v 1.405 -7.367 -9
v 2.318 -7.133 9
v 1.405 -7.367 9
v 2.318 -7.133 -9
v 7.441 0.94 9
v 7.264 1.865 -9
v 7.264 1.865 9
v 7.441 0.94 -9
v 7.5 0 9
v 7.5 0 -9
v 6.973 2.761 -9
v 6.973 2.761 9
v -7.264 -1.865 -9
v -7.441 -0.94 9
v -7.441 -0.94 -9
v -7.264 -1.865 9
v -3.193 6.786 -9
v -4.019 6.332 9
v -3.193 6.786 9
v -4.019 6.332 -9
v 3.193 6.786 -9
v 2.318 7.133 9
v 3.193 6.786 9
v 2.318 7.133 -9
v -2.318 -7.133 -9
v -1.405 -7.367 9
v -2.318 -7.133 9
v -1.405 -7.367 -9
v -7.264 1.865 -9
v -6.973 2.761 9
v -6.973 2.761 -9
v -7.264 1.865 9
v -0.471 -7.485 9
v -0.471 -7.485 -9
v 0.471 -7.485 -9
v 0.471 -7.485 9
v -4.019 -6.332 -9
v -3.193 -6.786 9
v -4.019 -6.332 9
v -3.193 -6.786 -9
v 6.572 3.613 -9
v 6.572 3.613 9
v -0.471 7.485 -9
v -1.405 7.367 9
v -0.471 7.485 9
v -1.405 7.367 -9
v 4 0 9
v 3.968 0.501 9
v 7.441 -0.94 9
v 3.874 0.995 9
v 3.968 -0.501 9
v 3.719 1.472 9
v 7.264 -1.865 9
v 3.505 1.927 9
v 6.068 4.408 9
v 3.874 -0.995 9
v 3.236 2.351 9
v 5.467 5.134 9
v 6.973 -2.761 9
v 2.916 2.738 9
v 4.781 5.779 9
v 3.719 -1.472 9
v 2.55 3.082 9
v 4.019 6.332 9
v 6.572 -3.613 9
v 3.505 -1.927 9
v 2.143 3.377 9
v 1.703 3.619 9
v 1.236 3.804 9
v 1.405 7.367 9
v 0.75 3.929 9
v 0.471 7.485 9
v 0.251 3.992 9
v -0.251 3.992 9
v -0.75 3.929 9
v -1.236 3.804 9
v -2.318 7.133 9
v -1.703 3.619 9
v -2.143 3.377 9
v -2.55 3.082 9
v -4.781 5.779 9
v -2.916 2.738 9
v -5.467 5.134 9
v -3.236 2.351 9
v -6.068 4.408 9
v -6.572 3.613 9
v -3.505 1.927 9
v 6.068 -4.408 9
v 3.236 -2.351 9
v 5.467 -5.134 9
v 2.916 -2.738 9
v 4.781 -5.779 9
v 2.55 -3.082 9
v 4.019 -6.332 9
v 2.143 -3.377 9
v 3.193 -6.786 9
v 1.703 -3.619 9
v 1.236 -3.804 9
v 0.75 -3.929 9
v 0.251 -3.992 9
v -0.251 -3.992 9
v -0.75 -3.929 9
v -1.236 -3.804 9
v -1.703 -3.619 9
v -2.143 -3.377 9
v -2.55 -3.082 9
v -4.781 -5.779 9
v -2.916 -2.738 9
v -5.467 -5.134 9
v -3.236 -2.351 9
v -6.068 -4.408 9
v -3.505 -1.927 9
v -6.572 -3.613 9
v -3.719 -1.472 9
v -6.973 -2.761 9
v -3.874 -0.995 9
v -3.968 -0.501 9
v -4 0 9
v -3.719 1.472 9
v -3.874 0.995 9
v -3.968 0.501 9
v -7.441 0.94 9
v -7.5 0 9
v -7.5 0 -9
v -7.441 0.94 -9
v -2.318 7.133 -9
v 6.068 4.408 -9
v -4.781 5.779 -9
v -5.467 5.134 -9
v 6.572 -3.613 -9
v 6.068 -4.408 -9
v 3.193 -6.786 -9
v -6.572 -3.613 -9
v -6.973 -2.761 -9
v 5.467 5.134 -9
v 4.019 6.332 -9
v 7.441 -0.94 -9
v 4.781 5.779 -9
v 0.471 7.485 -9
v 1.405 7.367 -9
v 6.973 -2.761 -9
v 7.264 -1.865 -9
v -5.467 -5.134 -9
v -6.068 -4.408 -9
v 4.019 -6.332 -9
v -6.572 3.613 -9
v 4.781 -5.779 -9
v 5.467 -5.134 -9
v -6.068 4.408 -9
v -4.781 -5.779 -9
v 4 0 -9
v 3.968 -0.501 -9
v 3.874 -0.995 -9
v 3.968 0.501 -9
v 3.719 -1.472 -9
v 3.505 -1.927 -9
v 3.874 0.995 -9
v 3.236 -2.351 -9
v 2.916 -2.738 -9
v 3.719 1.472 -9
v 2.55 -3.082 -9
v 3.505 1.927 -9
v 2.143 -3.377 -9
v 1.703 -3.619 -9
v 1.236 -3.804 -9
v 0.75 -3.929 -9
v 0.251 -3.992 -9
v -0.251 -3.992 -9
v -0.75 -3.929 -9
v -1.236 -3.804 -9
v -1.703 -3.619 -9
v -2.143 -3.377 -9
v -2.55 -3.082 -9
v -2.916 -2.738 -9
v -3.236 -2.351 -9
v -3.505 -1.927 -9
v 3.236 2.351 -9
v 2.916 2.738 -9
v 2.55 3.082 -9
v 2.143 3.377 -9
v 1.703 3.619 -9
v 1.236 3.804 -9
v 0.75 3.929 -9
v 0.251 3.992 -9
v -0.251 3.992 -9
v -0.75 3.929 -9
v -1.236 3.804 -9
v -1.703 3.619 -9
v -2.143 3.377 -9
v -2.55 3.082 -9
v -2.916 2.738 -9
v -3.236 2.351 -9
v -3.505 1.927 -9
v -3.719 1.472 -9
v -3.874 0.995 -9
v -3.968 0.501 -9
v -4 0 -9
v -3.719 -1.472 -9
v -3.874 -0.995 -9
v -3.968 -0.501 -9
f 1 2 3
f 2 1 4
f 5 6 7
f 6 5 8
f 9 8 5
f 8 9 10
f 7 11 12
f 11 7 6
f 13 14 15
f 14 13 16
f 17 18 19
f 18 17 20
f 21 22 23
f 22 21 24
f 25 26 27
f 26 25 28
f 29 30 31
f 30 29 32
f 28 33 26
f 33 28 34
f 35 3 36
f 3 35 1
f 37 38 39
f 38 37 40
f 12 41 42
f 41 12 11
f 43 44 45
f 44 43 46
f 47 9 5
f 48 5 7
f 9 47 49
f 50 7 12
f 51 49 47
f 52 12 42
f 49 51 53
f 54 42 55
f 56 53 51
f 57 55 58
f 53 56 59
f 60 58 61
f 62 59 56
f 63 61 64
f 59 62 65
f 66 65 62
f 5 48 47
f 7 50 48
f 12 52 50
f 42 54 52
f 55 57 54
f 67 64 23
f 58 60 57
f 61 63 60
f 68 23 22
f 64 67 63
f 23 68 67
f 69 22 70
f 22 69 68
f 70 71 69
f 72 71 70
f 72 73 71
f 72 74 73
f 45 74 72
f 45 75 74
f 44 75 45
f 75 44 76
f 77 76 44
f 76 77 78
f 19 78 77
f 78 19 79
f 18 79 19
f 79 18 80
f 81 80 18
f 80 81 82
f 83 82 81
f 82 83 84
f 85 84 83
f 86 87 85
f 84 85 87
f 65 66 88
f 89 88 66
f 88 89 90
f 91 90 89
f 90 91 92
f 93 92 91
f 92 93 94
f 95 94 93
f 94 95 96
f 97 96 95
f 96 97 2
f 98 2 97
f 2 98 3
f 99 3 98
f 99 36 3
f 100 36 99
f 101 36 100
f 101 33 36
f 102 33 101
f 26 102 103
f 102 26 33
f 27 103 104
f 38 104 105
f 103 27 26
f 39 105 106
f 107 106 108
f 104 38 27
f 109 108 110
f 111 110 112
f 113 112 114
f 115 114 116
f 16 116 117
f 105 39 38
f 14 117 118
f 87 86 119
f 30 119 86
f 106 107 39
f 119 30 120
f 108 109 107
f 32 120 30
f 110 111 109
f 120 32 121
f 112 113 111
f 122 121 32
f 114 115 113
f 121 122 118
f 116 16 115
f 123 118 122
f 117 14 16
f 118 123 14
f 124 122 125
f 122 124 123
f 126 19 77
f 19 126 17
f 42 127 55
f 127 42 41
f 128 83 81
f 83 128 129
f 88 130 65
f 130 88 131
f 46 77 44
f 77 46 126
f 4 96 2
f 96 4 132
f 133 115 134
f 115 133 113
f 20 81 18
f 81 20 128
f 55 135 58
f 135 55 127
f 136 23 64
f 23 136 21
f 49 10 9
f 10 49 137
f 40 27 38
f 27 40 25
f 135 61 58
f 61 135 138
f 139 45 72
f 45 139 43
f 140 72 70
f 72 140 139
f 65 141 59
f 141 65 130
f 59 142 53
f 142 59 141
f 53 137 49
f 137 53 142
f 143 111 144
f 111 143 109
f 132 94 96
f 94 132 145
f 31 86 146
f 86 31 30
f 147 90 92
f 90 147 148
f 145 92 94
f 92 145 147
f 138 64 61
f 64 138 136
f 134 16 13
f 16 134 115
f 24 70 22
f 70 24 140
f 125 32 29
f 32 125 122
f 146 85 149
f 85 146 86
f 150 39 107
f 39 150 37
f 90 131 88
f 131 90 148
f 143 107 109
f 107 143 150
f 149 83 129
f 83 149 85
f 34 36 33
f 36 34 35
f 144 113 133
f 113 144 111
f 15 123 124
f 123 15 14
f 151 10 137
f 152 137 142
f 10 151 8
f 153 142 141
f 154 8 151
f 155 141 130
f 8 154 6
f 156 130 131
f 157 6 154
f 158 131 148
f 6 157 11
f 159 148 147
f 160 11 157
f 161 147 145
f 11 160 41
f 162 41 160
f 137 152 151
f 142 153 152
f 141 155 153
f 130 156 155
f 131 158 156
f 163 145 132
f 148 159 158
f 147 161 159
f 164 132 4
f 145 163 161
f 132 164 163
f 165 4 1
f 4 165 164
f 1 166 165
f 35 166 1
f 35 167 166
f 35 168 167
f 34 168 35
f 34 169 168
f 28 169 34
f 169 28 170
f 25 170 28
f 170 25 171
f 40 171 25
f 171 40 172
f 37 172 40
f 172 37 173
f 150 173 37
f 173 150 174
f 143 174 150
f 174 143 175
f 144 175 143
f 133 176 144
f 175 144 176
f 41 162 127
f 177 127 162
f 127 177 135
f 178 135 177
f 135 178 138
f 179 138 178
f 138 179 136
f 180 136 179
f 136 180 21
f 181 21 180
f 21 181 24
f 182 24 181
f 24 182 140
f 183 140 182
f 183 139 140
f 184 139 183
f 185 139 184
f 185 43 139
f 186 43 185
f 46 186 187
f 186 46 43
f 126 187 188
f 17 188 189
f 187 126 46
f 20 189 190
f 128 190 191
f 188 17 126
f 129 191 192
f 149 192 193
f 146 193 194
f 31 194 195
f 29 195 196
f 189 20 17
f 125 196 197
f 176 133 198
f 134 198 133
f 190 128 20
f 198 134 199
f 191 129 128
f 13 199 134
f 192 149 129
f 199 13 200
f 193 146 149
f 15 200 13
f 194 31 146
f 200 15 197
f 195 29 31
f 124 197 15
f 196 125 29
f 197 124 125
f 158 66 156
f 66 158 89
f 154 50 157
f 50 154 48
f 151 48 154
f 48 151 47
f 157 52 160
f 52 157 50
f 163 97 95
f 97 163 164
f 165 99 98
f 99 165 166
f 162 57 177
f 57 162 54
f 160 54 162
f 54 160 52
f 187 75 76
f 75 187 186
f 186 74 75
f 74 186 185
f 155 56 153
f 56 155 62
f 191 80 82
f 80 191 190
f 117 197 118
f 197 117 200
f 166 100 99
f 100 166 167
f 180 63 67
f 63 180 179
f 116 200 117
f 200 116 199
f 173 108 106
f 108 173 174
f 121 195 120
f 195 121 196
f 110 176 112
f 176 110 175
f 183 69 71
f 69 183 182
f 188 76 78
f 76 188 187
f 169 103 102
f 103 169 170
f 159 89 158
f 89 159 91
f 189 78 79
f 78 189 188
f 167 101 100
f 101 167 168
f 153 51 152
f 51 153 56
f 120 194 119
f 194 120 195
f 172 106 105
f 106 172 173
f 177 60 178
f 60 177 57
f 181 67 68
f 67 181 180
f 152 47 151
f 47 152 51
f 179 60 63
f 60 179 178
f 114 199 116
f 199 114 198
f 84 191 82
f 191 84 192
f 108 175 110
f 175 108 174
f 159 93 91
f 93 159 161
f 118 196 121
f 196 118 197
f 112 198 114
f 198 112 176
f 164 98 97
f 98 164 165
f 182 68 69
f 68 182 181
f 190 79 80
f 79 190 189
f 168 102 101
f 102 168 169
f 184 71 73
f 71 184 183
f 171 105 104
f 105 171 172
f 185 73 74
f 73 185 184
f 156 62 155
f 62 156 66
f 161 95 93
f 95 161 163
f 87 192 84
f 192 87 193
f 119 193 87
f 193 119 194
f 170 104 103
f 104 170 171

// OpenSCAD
$fn = 50;


difference() {
	union() {
		translate(v = [0, 0, -9.0000000000]) {
			cylinder(h = 18, r = 7.5000000000);
		}
	}
	union() {
		translate(v = [0, 0, -100.0000000000]) {
			cylinder(h = 200, r = 4.0000000000);
		}
	}
}
